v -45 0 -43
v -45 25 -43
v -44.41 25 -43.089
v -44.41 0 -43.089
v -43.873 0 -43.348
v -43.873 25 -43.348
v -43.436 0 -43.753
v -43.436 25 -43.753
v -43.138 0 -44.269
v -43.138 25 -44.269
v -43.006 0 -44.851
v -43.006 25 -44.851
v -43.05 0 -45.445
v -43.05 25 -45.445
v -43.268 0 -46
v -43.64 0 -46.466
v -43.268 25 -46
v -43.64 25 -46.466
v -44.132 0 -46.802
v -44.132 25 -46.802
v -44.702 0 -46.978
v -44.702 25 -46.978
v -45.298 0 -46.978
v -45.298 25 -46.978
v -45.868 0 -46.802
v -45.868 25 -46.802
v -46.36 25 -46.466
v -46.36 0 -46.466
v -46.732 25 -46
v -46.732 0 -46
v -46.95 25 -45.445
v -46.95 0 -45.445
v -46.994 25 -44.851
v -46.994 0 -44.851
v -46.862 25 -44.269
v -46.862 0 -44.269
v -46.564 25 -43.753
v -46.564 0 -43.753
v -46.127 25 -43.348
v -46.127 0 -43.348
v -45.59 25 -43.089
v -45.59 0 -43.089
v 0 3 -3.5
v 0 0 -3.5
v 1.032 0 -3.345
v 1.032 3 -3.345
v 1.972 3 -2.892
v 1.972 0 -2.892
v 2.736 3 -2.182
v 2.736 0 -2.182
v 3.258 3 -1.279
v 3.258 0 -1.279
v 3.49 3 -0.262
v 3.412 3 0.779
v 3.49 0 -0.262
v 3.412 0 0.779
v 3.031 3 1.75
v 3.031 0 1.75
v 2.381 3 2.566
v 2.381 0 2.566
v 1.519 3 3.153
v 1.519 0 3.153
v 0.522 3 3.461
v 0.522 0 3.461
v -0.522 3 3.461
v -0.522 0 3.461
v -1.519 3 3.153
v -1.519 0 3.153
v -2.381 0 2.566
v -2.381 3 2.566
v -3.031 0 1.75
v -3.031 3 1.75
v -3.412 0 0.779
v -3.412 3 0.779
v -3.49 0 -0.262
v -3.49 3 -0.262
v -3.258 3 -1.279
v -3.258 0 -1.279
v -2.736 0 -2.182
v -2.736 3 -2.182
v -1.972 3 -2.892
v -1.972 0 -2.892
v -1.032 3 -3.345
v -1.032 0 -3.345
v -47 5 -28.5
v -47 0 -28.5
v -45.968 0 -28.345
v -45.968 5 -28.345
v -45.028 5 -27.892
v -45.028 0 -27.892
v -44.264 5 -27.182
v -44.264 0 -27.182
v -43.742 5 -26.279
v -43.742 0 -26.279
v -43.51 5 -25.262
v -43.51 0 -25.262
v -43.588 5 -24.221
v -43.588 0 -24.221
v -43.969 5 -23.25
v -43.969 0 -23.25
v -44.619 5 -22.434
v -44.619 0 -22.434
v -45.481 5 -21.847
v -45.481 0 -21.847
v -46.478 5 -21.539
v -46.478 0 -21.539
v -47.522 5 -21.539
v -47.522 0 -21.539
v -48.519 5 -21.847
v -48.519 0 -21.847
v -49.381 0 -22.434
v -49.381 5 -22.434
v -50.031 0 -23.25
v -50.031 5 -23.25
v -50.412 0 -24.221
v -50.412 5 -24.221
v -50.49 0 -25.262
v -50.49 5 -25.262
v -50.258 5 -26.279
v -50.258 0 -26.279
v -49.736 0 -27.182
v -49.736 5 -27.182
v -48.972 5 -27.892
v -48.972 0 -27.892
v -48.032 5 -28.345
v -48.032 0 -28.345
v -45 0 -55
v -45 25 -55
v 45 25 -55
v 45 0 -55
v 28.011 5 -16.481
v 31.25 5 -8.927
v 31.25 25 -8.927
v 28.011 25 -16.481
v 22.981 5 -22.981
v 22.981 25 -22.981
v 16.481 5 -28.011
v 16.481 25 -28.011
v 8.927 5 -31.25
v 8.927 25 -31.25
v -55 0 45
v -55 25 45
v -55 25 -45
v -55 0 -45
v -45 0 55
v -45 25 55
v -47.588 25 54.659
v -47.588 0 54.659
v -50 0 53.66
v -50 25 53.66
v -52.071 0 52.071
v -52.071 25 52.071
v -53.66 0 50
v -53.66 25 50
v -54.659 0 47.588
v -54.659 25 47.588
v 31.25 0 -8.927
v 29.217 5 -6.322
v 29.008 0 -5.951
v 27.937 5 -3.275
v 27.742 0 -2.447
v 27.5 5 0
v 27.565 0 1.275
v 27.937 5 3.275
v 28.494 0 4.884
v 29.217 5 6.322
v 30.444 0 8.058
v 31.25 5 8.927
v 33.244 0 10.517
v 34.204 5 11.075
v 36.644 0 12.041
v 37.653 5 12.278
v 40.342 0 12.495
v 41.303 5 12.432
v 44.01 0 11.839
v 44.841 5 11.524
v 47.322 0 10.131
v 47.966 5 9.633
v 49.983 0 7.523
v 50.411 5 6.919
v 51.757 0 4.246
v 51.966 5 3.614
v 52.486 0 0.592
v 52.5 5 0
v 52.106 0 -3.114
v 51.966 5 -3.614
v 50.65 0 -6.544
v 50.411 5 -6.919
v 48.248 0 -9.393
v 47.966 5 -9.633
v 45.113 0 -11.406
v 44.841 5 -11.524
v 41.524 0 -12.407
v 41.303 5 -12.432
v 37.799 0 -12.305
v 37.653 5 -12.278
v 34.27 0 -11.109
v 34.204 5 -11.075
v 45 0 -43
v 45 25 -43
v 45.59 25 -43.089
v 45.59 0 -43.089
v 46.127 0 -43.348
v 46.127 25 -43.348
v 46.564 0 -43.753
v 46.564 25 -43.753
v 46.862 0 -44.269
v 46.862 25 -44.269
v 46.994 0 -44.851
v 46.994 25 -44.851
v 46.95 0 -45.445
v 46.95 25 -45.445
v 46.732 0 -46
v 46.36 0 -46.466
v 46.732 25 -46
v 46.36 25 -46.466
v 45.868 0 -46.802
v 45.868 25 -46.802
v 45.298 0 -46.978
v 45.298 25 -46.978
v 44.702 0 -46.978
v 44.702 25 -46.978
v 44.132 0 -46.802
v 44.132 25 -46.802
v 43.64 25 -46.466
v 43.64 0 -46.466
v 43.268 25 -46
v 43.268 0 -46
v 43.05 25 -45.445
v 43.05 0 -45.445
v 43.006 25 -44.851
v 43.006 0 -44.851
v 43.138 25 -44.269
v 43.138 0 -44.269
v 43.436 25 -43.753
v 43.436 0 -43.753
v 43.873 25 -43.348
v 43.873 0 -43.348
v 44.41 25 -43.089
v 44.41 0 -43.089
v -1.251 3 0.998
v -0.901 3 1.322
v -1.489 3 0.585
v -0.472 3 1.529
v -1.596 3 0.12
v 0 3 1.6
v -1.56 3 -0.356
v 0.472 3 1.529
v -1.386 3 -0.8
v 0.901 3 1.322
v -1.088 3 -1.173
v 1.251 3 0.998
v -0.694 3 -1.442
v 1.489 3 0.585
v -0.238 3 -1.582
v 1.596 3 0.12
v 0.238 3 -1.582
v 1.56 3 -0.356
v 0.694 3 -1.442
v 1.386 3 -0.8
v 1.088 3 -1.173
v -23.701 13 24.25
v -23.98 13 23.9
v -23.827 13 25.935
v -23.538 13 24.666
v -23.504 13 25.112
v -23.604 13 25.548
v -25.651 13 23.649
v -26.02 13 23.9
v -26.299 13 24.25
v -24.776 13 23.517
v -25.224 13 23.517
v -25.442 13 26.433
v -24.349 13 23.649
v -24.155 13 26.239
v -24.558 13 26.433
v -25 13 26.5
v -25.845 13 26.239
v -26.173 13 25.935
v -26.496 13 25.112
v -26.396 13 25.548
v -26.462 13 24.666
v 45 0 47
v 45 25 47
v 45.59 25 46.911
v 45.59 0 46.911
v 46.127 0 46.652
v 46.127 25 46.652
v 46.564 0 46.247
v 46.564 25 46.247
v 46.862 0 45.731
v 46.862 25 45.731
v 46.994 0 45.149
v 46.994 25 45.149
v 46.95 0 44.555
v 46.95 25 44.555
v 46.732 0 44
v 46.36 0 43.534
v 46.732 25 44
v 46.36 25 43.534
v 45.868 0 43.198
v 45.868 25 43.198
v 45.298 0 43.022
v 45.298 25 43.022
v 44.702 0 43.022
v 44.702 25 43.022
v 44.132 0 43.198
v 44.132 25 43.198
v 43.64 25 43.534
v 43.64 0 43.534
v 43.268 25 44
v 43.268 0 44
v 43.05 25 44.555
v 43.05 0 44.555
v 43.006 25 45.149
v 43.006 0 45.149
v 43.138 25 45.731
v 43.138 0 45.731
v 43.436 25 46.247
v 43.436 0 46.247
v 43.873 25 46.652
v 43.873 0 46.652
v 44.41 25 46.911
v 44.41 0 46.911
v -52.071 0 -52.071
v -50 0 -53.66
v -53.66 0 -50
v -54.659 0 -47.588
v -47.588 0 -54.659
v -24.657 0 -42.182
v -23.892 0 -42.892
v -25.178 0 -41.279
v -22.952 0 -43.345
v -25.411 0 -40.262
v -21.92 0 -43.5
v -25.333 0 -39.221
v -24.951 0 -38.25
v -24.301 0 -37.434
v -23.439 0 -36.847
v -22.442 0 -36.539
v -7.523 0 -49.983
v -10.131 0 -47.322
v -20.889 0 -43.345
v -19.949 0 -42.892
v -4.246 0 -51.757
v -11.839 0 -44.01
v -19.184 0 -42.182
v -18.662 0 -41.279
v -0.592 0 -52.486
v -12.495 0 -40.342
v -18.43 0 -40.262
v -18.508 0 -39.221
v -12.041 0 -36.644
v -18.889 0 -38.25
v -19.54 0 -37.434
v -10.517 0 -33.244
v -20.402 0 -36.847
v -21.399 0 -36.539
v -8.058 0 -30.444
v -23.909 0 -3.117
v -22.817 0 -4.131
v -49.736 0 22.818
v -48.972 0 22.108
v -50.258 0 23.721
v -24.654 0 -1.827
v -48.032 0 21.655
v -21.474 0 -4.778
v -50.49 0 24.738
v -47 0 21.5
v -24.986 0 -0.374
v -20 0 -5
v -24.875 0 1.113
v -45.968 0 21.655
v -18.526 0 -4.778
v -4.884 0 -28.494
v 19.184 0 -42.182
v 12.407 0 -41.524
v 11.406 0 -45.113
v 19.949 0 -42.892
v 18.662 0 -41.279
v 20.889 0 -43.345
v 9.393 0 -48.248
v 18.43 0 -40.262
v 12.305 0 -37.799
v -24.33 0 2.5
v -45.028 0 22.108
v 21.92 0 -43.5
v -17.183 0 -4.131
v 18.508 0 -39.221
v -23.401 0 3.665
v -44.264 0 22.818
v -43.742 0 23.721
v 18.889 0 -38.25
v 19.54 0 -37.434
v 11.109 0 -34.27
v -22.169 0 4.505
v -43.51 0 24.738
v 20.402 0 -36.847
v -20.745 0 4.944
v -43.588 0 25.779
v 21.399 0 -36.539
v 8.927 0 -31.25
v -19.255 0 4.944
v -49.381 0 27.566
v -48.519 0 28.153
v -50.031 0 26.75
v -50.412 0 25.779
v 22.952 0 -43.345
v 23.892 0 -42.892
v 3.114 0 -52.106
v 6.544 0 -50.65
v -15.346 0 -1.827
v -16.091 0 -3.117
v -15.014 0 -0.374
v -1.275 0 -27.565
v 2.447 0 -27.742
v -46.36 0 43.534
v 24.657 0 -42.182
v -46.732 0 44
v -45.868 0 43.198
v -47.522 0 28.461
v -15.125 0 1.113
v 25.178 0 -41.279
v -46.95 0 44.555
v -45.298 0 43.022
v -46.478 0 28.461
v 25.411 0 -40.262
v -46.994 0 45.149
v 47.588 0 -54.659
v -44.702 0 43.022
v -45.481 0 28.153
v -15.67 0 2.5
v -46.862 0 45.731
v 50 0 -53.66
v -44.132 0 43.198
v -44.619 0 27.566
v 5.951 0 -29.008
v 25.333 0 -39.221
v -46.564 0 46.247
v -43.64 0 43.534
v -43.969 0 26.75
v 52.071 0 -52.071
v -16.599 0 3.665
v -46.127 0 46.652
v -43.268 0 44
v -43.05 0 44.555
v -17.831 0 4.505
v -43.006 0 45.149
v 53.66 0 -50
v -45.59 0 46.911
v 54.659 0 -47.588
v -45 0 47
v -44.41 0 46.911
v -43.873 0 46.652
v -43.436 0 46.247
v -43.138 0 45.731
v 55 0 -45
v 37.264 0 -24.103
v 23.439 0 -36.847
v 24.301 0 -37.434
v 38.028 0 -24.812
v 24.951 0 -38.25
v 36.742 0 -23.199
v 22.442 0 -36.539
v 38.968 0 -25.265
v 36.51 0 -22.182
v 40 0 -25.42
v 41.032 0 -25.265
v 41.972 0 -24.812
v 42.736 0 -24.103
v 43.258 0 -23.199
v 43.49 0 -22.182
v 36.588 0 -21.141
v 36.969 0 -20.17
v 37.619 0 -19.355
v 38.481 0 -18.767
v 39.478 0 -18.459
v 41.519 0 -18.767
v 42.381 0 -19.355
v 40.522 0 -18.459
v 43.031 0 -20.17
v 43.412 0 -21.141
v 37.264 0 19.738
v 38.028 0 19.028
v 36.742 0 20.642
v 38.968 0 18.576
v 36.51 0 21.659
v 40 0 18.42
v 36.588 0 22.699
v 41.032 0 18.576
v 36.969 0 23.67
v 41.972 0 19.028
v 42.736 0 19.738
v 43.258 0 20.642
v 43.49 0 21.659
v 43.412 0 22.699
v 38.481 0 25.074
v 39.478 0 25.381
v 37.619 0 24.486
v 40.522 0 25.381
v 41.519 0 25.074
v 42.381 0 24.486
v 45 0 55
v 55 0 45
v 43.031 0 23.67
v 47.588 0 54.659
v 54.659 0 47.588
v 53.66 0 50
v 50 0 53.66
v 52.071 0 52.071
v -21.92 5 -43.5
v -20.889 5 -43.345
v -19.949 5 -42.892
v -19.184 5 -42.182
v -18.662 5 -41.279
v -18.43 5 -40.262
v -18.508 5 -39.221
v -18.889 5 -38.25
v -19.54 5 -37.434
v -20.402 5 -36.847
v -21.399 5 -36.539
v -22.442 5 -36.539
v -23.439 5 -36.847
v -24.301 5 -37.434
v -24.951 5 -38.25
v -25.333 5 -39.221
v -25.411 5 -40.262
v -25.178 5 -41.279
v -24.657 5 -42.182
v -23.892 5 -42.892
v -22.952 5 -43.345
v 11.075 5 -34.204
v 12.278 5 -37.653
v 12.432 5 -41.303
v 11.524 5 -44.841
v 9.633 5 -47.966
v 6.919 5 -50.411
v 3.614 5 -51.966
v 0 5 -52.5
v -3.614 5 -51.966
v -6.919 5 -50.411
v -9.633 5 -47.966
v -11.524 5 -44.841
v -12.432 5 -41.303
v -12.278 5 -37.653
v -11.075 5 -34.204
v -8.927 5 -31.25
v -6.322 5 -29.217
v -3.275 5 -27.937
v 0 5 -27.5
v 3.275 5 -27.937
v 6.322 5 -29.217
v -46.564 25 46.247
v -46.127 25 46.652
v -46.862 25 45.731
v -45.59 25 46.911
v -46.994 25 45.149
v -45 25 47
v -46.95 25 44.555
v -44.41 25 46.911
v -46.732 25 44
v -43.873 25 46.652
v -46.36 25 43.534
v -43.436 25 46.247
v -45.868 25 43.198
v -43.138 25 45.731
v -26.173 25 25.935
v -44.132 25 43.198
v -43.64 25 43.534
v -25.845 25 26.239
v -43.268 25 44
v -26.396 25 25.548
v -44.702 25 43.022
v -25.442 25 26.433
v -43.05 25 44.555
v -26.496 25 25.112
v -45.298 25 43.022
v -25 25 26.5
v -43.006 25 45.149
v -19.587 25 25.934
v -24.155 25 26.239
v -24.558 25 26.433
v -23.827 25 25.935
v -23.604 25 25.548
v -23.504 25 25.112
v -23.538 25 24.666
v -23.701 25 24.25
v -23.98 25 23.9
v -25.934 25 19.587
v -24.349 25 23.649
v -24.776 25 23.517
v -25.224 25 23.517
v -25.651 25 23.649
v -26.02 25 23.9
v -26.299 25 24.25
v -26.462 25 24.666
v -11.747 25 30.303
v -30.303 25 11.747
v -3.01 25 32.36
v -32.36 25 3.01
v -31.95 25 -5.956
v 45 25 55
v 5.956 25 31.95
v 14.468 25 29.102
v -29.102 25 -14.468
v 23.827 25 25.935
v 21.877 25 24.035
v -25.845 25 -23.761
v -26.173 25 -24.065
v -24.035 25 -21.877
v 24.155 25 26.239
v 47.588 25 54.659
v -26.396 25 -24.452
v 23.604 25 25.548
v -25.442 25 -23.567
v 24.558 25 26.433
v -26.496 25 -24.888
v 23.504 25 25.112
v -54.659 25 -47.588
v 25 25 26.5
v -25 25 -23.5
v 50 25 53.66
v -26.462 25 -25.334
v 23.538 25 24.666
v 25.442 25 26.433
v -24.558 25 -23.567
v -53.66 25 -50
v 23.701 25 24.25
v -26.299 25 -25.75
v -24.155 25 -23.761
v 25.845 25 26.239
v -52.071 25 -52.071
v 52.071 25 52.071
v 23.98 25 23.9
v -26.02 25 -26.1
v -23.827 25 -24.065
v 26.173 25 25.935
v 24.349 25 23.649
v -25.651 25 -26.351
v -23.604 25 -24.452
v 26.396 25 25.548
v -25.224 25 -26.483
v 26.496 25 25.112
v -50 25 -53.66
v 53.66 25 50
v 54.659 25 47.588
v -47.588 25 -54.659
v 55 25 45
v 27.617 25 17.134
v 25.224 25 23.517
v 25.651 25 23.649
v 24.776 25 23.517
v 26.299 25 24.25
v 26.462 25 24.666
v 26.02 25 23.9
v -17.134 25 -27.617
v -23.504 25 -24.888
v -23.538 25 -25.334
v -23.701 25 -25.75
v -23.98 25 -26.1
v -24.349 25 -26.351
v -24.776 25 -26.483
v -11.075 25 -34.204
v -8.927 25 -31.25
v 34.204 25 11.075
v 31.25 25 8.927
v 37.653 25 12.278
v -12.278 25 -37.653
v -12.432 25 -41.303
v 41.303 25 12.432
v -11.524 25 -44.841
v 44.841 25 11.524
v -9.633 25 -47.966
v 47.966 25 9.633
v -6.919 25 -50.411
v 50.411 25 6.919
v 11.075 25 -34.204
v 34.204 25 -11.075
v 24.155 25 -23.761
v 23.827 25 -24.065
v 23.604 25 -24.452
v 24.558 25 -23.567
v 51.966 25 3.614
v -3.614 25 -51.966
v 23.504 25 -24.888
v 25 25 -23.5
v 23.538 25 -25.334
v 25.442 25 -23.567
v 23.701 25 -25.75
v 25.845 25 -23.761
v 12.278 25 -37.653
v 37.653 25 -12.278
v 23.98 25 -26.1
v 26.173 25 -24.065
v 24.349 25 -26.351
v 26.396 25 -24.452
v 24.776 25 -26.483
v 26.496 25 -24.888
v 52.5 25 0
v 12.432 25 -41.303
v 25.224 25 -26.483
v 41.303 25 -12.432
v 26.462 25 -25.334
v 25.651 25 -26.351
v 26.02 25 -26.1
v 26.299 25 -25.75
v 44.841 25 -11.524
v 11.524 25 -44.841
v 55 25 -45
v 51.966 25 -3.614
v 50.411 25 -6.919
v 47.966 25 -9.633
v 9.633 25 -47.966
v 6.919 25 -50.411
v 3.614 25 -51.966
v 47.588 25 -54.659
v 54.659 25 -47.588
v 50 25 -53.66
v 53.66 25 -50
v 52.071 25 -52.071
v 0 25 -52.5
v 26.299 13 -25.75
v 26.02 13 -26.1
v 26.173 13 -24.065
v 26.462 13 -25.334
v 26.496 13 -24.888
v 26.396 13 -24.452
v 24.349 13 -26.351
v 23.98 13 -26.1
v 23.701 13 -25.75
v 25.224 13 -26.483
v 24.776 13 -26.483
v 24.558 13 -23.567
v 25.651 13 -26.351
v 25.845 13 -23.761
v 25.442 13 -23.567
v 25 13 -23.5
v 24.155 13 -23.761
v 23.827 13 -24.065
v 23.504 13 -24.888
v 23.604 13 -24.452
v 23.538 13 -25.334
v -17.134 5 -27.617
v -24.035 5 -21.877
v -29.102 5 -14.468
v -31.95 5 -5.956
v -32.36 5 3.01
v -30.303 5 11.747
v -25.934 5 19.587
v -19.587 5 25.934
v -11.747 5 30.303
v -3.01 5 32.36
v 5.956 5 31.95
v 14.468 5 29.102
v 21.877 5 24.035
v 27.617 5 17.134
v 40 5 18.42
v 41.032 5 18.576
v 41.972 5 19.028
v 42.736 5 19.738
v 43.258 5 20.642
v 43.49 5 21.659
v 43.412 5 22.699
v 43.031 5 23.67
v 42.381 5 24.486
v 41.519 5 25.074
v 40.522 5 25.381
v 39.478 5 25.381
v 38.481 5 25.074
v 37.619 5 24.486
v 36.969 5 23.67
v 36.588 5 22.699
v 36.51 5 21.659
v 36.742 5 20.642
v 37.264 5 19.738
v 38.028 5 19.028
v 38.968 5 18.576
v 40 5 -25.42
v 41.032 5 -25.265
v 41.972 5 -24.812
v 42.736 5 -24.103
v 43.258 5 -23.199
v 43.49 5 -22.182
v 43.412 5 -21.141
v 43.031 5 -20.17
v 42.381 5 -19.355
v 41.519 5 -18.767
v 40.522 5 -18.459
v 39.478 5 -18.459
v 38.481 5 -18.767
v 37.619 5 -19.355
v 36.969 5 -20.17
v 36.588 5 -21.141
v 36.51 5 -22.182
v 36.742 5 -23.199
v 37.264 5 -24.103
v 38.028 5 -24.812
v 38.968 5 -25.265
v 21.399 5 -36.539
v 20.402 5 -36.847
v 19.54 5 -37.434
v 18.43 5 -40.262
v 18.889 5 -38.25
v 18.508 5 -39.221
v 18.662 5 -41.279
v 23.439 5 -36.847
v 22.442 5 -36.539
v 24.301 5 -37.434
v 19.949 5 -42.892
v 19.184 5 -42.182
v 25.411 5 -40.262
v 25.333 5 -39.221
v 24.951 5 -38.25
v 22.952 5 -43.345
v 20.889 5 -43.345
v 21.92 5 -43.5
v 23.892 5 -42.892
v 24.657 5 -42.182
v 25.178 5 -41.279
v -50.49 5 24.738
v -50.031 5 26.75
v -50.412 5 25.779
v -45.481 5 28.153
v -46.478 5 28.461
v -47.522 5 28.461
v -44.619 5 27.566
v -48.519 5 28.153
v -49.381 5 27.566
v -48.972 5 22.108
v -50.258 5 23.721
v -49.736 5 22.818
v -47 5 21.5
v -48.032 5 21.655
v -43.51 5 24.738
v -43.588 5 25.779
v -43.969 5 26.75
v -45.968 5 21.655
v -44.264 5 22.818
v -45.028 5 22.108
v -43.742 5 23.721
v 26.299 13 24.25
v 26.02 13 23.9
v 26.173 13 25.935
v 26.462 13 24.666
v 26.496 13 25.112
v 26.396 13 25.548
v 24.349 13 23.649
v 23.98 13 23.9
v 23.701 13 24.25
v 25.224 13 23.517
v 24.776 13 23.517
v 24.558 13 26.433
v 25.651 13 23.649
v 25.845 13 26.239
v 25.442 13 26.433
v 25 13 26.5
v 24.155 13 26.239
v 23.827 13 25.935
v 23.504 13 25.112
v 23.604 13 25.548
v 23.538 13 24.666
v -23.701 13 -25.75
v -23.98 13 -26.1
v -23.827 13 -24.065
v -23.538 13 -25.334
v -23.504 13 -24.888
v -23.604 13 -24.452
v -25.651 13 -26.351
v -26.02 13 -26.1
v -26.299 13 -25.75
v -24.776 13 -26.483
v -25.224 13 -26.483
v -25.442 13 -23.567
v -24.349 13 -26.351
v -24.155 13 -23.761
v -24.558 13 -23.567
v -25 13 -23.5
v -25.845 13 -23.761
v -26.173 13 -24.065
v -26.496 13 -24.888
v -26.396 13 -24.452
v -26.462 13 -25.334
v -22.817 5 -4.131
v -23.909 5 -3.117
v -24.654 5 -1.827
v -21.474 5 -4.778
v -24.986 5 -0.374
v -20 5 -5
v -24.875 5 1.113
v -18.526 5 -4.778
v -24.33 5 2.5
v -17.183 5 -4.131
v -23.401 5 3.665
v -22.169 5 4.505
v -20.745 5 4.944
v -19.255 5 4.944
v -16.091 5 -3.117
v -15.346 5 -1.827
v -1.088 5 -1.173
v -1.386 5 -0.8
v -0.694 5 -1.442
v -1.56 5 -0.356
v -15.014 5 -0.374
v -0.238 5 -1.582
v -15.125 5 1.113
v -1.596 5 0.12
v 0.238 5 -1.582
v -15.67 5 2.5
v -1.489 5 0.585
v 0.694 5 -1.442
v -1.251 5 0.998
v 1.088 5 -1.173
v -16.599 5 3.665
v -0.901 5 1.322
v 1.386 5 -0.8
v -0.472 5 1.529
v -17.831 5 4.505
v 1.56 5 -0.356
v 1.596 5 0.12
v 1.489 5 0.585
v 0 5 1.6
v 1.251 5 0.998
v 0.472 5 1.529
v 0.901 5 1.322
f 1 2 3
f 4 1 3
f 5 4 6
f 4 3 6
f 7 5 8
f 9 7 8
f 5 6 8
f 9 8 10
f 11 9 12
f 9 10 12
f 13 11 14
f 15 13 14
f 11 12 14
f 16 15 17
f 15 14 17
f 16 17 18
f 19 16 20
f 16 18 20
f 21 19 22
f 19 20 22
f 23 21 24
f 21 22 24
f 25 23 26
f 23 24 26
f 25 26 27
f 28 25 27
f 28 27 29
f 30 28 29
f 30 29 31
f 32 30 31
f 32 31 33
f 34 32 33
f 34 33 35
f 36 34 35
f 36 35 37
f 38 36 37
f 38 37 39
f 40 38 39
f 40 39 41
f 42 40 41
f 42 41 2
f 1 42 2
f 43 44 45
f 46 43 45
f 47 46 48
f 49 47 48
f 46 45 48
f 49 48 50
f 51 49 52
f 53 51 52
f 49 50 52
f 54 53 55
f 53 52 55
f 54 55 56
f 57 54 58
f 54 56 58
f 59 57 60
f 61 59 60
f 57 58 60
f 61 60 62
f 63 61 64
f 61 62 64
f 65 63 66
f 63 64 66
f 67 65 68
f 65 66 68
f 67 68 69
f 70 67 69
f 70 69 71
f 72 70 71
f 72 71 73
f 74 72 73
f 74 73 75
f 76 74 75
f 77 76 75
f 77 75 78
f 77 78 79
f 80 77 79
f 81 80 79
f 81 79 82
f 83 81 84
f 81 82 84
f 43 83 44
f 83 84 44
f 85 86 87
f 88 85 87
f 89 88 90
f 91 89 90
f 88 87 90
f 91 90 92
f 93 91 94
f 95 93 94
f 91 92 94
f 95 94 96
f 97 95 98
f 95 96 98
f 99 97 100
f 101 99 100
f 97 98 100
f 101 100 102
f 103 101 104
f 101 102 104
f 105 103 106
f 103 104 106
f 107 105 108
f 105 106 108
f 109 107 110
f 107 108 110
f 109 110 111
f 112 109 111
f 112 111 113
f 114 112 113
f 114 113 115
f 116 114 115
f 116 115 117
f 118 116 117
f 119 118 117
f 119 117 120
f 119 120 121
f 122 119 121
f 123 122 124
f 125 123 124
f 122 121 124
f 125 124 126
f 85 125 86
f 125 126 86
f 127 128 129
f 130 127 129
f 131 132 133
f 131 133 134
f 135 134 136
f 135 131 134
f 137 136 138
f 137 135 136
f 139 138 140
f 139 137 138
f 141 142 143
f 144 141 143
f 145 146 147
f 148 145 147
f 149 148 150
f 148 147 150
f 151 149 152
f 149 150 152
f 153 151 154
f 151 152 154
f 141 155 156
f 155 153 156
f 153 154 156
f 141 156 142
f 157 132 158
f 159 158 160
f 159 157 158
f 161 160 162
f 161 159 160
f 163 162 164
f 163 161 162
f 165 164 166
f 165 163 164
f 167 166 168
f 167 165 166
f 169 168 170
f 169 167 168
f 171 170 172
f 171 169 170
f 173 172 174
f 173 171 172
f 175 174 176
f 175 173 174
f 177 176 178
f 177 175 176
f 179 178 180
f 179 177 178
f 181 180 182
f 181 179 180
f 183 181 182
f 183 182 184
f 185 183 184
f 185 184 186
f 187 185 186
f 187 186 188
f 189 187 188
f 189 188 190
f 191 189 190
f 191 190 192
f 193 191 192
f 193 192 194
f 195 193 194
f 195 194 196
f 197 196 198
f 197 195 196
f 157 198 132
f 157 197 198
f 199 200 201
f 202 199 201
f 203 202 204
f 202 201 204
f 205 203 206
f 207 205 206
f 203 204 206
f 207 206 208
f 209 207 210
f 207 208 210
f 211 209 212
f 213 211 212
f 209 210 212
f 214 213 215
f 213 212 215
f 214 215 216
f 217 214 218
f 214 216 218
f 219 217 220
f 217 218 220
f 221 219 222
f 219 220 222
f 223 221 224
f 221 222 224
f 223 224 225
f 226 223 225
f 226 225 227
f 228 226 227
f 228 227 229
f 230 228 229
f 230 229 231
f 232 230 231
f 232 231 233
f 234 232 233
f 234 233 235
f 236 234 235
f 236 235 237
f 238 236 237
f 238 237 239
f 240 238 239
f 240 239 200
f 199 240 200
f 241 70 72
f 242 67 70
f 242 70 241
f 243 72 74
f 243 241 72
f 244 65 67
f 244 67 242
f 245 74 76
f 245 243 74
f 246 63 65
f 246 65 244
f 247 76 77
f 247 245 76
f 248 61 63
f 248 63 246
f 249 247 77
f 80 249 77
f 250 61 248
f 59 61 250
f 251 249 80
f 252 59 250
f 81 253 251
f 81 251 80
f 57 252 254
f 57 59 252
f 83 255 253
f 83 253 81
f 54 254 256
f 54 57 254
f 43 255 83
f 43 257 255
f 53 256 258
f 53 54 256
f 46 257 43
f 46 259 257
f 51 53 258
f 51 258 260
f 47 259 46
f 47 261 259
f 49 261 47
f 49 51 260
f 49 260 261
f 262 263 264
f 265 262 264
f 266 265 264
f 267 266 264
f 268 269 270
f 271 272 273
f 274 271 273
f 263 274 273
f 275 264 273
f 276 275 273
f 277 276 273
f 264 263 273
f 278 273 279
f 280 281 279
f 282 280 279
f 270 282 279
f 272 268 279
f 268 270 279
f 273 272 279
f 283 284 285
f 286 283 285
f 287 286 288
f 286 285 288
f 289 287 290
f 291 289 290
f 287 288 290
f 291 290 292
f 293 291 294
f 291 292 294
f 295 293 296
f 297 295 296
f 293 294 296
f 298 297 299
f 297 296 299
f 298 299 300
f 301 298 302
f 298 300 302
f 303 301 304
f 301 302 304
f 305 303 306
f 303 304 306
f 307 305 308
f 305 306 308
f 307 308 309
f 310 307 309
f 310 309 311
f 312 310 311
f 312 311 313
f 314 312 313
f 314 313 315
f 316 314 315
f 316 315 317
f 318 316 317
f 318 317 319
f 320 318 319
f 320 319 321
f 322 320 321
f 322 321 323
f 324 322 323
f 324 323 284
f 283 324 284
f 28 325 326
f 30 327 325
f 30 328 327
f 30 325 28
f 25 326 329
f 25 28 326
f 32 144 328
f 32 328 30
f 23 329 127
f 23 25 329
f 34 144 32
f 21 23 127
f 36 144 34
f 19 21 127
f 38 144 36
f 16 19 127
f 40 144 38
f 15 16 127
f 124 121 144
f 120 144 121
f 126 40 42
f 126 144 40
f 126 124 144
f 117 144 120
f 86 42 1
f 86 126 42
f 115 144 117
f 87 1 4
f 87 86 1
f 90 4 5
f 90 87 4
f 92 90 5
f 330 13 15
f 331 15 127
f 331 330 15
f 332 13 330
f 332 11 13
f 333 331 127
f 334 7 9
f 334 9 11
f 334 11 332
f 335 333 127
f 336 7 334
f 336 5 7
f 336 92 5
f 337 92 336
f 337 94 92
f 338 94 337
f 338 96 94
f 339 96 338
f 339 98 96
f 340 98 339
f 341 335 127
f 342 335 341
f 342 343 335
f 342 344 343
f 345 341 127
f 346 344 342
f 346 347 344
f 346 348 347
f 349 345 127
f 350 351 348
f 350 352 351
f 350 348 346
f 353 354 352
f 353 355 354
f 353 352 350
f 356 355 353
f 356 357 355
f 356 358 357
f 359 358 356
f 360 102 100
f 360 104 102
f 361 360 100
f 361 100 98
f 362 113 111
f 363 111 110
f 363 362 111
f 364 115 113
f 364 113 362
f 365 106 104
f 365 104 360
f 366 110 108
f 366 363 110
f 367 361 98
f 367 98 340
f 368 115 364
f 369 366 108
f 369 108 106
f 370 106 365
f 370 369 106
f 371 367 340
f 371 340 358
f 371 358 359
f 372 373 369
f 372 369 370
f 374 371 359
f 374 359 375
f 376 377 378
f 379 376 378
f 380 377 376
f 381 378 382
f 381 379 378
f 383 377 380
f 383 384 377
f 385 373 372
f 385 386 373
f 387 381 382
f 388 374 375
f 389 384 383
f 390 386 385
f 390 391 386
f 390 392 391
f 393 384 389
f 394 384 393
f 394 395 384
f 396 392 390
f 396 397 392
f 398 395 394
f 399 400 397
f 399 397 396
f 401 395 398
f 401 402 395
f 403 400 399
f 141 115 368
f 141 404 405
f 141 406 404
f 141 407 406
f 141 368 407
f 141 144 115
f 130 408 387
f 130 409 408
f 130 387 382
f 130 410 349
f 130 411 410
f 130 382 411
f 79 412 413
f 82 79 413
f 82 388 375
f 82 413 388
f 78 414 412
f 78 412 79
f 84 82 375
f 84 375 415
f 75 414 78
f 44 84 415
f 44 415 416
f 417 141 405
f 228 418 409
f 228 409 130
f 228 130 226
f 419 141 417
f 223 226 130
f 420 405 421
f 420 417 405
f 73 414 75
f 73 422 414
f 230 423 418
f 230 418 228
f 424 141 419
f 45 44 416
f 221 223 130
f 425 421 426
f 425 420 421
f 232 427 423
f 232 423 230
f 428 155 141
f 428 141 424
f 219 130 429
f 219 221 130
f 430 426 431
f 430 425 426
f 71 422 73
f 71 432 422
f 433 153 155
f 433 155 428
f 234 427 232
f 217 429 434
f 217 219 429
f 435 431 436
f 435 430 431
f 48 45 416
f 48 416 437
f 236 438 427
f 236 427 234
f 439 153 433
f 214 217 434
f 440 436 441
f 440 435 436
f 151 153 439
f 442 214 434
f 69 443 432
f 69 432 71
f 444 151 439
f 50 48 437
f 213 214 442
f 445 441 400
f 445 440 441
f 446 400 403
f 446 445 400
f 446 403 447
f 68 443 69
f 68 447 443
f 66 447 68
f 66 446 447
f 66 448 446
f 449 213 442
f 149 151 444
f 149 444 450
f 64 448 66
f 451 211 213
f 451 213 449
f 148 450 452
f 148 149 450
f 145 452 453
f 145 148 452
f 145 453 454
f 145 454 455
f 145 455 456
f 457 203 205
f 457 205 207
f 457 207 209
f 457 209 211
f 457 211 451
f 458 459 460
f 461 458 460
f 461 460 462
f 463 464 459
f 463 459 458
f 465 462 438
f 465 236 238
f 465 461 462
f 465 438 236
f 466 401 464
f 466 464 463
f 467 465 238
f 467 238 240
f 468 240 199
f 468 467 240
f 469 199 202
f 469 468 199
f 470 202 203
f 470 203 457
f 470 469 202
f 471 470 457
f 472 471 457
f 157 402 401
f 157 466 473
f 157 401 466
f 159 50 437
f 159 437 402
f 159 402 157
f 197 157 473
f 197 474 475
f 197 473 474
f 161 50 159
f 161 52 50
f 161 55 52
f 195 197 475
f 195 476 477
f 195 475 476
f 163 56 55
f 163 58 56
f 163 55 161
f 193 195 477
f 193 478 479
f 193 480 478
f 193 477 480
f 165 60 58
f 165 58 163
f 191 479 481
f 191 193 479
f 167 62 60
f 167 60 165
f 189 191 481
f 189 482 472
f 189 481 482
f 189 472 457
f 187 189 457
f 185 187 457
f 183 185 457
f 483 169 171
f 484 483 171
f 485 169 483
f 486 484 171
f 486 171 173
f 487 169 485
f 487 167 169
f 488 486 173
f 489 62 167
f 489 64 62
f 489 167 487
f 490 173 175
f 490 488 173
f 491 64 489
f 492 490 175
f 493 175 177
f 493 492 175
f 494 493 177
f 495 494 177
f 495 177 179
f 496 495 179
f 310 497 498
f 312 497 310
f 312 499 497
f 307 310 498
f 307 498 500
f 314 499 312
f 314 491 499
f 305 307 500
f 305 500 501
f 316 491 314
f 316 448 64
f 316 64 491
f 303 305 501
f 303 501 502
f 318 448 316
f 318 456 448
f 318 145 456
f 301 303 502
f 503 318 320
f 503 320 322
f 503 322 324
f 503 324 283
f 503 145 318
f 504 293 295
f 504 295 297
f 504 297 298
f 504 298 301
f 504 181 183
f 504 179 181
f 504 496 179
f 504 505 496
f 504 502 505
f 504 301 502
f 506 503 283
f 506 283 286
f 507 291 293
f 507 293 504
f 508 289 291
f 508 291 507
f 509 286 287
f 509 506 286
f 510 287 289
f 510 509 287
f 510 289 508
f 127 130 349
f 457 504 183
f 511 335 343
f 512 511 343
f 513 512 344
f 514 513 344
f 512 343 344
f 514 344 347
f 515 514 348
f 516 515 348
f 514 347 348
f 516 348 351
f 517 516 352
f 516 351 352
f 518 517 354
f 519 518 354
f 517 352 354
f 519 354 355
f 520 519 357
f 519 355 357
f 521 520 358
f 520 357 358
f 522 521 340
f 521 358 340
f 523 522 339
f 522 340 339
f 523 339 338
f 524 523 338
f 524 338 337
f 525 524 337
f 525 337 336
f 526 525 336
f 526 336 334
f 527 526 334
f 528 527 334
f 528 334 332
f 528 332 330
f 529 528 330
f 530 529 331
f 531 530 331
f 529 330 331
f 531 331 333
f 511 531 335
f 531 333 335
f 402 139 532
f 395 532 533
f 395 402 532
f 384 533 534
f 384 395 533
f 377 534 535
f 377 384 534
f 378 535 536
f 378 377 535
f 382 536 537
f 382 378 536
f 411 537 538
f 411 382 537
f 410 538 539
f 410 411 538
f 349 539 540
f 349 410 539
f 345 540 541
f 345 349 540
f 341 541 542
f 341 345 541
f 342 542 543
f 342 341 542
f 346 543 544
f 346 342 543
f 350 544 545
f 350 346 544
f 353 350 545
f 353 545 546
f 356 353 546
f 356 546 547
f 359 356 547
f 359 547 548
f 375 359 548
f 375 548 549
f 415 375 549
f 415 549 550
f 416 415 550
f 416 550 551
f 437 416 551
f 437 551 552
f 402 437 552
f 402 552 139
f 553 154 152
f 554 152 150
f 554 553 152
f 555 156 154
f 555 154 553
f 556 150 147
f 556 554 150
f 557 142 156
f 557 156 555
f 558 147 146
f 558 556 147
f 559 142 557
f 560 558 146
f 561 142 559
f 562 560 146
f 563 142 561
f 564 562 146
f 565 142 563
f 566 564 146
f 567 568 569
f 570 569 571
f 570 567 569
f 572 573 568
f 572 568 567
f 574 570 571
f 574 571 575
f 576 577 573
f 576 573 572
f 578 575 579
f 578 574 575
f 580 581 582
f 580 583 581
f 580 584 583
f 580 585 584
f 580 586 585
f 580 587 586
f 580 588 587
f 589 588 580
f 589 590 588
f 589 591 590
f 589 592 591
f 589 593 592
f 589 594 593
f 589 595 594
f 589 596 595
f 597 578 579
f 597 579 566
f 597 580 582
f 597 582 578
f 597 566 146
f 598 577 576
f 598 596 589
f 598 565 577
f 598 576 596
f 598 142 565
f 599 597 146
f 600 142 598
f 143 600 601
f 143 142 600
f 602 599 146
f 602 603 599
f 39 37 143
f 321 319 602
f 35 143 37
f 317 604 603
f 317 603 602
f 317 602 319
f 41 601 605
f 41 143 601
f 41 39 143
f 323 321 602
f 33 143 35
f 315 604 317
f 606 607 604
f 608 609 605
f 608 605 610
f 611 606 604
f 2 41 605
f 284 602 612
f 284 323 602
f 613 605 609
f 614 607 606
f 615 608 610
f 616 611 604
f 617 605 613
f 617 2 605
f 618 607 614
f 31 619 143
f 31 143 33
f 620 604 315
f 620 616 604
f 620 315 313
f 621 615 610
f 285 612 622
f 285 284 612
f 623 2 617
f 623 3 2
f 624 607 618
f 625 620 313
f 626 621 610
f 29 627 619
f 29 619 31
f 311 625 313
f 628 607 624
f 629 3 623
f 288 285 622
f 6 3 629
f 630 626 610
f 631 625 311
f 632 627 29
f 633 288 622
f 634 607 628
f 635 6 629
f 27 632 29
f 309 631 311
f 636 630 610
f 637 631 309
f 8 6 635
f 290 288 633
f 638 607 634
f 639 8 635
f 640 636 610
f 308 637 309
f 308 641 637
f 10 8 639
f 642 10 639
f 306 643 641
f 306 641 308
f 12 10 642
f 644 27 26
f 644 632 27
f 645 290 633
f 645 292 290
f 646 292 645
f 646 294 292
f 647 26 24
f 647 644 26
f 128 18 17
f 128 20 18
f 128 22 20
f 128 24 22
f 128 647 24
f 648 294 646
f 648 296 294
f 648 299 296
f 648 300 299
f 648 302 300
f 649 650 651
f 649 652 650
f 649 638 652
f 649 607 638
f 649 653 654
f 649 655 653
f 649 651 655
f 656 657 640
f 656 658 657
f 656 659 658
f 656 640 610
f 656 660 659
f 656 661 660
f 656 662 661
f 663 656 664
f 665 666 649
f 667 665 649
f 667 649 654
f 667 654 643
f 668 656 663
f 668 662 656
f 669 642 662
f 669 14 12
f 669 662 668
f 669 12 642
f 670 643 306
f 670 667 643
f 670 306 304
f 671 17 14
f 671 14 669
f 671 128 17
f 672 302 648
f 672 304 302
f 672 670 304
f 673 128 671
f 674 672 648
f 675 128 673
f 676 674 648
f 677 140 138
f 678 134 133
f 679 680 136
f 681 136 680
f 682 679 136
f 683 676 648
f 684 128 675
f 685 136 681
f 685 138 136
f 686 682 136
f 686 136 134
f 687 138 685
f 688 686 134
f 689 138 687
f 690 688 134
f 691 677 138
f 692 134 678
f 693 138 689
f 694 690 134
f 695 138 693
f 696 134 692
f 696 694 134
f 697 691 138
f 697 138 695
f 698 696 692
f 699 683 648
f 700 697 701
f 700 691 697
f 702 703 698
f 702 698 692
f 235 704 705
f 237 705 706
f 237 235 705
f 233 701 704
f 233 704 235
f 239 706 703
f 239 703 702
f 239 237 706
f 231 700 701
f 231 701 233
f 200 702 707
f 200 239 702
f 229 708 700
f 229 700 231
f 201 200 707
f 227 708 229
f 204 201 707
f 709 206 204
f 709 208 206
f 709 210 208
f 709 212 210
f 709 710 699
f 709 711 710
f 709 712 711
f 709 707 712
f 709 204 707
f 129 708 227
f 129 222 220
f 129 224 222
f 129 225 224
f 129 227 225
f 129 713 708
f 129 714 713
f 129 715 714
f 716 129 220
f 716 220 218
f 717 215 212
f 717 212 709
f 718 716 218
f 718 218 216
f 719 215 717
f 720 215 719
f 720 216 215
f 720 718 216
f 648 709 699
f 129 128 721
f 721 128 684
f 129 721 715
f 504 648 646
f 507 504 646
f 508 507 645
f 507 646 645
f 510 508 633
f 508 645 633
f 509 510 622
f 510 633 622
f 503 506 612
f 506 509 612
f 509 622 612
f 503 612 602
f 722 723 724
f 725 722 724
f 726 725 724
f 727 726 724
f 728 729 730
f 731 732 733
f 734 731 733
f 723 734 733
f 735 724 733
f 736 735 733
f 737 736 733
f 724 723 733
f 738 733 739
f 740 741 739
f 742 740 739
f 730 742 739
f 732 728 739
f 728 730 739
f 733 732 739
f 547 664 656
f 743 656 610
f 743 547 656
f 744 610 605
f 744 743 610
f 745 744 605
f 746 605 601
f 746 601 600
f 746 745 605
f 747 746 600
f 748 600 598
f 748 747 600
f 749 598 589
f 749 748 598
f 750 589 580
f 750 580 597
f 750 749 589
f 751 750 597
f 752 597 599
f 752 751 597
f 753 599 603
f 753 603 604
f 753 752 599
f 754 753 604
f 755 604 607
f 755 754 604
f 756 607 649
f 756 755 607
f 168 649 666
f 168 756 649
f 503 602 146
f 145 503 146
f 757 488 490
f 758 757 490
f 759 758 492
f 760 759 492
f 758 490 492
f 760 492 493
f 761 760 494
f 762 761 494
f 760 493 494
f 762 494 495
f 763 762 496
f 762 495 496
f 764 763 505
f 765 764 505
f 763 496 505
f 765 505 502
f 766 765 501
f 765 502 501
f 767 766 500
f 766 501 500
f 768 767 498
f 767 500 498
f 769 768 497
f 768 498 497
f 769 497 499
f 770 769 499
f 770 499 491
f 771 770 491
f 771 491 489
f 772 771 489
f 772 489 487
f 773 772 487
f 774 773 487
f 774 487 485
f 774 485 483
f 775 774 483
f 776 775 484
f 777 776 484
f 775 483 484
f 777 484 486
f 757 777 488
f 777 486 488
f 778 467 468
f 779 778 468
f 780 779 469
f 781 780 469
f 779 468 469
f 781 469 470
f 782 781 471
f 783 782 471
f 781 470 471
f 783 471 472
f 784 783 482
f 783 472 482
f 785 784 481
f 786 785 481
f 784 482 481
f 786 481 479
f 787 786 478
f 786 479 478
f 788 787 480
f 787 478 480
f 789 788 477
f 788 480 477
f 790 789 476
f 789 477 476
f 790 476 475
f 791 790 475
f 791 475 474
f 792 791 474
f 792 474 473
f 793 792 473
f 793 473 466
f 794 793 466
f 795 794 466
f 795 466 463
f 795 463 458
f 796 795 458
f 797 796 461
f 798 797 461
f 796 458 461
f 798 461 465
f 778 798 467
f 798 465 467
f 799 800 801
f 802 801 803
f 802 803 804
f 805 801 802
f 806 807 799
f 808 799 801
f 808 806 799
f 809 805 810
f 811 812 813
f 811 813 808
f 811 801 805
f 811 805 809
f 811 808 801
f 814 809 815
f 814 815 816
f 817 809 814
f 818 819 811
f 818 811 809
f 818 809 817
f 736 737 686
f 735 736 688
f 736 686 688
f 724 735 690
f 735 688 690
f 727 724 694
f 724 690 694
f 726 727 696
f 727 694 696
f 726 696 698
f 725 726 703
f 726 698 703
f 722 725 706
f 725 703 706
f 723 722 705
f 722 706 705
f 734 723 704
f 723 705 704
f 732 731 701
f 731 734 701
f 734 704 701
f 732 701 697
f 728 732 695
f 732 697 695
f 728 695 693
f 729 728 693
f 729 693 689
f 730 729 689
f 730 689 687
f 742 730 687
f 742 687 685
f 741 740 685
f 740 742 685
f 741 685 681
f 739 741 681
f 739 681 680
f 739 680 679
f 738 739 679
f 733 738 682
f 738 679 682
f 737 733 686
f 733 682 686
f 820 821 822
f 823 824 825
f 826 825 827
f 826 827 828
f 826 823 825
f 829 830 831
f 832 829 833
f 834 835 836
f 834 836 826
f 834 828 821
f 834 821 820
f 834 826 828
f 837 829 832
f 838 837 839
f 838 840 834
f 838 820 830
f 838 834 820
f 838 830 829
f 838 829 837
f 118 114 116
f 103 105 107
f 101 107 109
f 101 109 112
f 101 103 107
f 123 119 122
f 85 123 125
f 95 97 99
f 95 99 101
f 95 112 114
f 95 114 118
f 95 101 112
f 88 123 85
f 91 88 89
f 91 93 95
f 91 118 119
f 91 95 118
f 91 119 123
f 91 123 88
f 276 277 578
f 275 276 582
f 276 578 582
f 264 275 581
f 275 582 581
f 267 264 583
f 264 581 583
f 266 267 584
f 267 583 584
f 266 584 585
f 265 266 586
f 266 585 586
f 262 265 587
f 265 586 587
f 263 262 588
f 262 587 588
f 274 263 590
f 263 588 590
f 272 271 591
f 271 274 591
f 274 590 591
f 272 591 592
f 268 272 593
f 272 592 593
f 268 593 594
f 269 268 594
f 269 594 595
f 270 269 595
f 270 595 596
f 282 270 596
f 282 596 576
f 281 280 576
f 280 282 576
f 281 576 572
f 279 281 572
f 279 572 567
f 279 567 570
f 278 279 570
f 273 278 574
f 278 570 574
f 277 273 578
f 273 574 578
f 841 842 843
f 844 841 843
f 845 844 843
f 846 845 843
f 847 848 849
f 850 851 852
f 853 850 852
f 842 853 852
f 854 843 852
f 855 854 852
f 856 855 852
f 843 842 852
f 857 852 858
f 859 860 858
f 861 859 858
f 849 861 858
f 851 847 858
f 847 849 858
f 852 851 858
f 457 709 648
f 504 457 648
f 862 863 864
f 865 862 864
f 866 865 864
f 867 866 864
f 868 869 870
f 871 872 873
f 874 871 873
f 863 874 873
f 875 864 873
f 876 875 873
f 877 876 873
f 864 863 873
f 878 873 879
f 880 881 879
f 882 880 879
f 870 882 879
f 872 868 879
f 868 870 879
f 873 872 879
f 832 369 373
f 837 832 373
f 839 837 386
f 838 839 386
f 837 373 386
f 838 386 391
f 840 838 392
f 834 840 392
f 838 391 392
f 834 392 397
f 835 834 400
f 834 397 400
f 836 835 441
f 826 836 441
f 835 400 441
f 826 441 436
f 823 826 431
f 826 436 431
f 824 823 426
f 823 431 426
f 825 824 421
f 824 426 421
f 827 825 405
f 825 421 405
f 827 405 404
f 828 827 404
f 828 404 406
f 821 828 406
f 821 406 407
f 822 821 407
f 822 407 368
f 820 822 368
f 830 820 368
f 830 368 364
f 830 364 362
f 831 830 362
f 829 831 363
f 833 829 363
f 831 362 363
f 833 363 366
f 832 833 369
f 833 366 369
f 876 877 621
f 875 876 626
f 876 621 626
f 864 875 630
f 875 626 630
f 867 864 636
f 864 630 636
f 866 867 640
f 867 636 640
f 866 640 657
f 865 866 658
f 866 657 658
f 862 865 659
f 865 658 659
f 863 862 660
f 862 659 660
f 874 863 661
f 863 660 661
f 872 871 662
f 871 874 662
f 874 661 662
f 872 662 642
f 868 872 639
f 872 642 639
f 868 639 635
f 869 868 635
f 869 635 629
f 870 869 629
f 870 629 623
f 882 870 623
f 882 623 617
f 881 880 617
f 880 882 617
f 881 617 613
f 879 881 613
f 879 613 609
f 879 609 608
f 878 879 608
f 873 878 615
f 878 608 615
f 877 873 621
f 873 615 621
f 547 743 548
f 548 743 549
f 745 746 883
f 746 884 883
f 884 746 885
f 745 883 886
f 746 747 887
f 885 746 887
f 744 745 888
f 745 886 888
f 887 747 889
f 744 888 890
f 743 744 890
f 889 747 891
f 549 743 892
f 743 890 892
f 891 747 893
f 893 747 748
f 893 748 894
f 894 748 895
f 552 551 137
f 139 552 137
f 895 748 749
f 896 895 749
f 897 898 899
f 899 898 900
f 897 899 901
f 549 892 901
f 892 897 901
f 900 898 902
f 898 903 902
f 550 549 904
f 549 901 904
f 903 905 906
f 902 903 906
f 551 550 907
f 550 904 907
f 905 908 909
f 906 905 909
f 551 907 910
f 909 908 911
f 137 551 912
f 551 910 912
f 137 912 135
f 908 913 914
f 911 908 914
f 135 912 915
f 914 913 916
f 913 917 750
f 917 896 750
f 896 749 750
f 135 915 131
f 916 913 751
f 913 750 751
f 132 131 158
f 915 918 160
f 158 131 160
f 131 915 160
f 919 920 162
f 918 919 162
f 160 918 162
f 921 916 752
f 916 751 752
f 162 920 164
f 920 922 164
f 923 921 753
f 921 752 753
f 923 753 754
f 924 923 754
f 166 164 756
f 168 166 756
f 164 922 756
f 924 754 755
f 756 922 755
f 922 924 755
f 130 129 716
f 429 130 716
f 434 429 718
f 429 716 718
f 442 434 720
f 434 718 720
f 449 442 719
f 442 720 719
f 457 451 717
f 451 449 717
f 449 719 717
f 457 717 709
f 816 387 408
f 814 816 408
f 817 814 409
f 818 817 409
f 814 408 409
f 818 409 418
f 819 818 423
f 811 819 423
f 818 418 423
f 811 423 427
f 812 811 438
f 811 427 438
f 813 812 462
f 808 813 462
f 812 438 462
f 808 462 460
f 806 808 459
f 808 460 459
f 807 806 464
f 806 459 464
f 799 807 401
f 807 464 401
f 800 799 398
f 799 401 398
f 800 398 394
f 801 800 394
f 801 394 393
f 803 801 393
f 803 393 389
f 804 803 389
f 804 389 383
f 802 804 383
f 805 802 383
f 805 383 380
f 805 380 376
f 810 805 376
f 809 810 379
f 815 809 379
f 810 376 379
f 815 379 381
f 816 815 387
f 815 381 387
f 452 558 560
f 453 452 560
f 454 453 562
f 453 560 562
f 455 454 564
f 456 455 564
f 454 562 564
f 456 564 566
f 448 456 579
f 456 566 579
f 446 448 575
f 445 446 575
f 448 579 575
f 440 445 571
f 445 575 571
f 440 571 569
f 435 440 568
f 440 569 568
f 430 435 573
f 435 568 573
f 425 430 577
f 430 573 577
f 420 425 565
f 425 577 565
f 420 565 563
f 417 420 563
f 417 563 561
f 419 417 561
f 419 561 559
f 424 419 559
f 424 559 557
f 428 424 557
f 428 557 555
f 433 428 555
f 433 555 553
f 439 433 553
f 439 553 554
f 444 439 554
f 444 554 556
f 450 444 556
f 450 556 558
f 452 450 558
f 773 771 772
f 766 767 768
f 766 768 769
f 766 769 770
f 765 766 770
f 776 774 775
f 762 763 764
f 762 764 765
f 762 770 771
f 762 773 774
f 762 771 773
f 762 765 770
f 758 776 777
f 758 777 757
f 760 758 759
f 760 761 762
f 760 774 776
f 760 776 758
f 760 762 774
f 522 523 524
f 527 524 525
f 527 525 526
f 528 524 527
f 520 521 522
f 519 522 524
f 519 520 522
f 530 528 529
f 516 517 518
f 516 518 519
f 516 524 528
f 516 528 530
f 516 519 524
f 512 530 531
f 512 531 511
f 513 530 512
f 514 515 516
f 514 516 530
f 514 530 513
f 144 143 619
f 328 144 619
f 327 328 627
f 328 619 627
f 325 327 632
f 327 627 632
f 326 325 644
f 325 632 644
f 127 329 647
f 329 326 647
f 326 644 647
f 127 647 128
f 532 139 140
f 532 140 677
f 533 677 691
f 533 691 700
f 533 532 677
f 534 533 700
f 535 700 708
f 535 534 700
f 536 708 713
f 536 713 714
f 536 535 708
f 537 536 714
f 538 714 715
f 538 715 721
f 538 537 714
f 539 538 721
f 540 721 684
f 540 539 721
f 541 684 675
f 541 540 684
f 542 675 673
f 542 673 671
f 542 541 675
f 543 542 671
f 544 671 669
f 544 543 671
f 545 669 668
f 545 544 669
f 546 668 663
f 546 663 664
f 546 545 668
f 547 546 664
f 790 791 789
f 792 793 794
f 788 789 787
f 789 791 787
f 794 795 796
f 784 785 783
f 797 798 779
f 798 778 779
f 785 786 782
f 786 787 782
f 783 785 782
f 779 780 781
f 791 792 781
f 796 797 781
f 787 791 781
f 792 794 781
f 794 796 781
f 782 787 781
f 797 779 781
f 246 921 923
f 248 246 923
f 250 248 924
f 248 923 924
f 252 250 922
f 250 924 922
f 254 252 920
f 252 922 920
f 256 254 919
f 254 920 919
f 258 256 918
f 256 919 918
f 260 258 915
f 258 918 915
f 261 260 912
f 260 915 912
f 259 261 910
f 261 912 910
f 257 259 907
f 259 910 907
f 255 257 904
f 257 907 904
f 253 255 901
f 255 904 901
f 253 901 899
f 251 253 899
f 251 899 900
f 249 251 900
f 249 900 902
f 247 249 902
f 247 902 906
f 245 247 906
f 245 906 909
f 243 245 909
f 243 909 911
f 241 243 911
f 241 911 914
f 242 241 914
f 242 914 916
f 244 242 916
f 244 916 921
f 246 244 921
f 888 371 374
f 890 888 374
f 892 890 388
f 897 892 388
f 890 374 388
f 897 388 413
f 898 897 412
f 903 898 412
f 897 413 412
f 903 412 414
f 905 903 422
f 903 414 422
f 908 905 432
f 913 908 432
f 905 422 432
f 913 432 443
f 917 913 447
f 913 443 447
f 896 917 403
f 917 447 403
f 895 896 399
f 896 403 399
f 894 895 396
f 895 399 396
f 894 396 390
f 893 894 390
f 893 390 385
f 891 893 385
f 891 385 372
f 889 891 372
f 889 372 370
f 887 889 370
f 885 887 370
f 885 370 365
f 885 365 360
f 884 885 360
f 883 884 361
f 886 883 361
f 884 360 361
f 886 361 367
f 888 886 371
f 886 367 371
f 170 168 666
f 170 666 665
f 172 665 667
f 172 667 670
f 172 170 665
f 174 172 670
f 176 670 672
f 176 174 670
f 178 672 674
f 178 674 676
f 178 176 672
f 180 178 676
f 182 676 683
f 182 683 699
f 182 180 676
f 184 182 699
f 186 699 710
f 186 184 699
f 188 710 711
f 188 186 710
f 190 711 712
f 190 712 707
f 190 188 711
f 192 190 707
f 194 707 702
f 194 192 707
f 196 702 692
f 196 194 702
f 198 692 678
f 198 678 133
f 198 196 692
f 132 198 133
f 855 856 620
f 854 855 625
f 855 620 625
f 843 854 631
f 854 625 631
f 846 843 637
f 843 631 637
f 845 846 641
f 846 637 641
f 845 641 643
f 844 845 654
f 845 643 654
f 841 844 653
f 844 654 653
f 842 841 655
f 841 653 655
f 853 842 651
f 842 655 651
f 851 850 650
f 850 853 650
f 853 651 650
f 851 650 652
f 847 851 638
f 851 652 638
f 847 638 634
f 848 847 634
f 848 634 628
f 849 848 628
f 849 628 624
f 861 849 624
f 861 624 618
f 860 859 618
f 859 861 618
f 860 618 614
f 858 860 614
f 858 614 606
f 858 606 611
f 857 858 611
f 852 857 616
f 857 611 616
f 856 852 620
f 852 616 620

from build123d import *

# Parameters (mm, degrees)
SKETCH_1_W          = 130
SKETCH_1_H          = 130
SKETCH_1_R          = 1.6
EXTRUDE_1_DEPTH     = 25
SKETCH_2_R          = 5
EXTRUDE_2_DEPTH     = 5
SKETCH_3_R          = 1.5
SKETCH_3_R_2        = 2
CUT_EXTRUDE_1_DEPTH = 103.102889283
FILLET_1_R          = 10
SKETCH_4_R          = 1.6
CUT_EXTRUDE_2_DEPTH = 10
CUT_EXTRUDE_START   = -10
SKETCH_5_R          = 12.5
CUT_EXTRUDE_3_DEPTH = 10
SKETCH_6_OUTSIDE_W  = 169.108
SKETCH_6_OUTSIDE_H  = 169.108
CUT_EXTRUDE_4_DEPTH = 103.102889283
SKETCH_7_R          = 3.5
CUT_EXTRUDE_5_DEPTH = 3
SKETCH_9_R          = 3.5
CUT_EXTRUDE_6_DEPTH = 5
EXTRUDE_START       = -20
SKETCH_10_R         = 1.6
EXTRUDE_3_DEPTH     = 20
EXTRUDE_START_2     = -13
SKETCH_11_R         = 1.5
EXTRUDE_4_DEPTH     = 13


with BuildPart() as part:
    # 草图1 → 凸台-拉伸1 (new body)
    with BuildSketch(Plane(origin=(0, 0, 0), x_dir=(1, 0, 0), z_dir=(0, 1, 0))):
        with Locations((5, 5)):
            Rectangle(SKETCH_1_W, SKETCH_1_H)
        with Locations(Location((61.920310217, 0, 0), (0, 0, 270))):
            Circle(SKETCH_1_R, mode=Mode.SUBTRACT)
        with Locations(Location((40, -21.920310217, 0), (0, 0, 270))):
            Circle(SKETCH_1_R, mode=Mode.SUBTRACT)
        with Locations(Location((40, 21.920310217, 0), (0, 0, 270))):
            Circle(SKETCH_1_R, mode=Mode.SUBTRACT)
        with Locations(Location((21.920310217, 40, 0), (0, 0, 270))):
            Circle(SKETCH_1_R, mode=Mode.SUBTRACT)
        with Locations(Location((-21.920310217, 40, 0), (0, 0, 270))):
            Circle(SKETCH_1_R, mode=Mode.SUBTRACT)
        with Locations(Location((0, 61.920310217, 0), (0, 0, 270))):
            Circle(SKETCH_1_R, mode=Mode.SUBTRACT)
        with BuildLine():
            ThreePointArc((-8.926785536, 31.25), (-22.980970389, -22.980970389), (31.25, -8.926785536))
            ThreePointArc((31.25, -8.926785536), (52.5, 0), (31.25, 8.926785536))
            ThreePointArc((31.25, 8.926785536), (22.980970389, 22.980970389), (8.926785536, 31.25))
            ThreePointArc((8.926785536, 31.25), (0, 52.5), (-8.926785536, 31.25))
        make_face(mode=Mode.SUBTRACT)
    extrude(amount=EXTRUDE_1_DEPTH)

    # 草图2 → 凸台-拉伸2 (add)
    with BuildSketch(Plane.XZ):
        with BuildLine():
            ThreePointArc((-8.926785536, -31.25), (0, -52.5), (8.926785536, -31.25))
            ThreePointArc((8.926785536, -31.25), (22.980970389, -22.980970389), (31.25, -8.926785536))
            ThreePointArc((31.25, -8.926785536), (52.5, 0), (31.25, 8.926785536))
            ThreePointArc((31.25, 8.926785536), (-22.980970389, 22.980970389), (-8.926785536, -31.25))
        make_face()
        with Locations(Location((-20, 0, 0), (0, 0, 270))):
            Circle(SKETCH_2_R, mode=Mode.SUBTRACT)
    extrude(amount=-EXTRUDE_2_DEPTH)

    # 草图3 → 切除-拉伸1 (cut, through all)
    with BuildSketch(Plane(origin=(0, 25, 0), x_dir=(1, 0, 0), z_dir=(0, 1, 0))):
        with Locations(Location((-25, 25, 0), (0, 0, 270))):
            Circle(SKETCH_3_R)
        with Locations(Location((25, 25, 0), (0, 0, 270))):
            Circle(SKETCH_3_R)
        with Locations(Location((-25, -25, 0), (0, 0, 270))):
            Circle(SKETCH_3_R)
        with Locations(Location((25, -25, 0), (0, 0, 270))):
            Circle(SKETCH_3_R)
        with Locations(Location((-45, 45, 0), (0, 0, 270))):
            Circle(SKETCH_3_R_2)
        with Locations(Location((45, 45, 0), (0, 0, 270))):
            Circle(SKETCH_3_R_2)
        with Locations(Location((45, -45, 0), (0, 0, 270))):
            Circle(SKETCH_3_R_2)
        with Locations(Location((-45, -45, 0), (0, 0, 270))):
            Circle(SKETCH_3_R_2)
    extrude(amount=-CUT_EXTRUDE_1_DEPTH, mode=Mode.SUBTRACT)

    # 圆角1
    fillet_1_edges = [part.edges().sort_by_distance(p)[0] for p in [
        (-60, 12.5, -70),
        (70, 12.5, -70),
        (70, 12.5, 60),
        (-60, 12.5, 60),
    ]]
    fillet(fillet_1_edges, radius=FILLET_1_R)

    # 草图4 → 切除-拉伸2 (cut)
    with BuildSketch(Plane(origin=(0, 5, 0), x_dir=(1, 0, 0), z_dir=(0, 1, 0))):
        with Locations(Location((0, 0, 0), (0, 0, 270))):
            Circle(SKETCH_4_R)
    extrude(amount=-CUT_EXTRUDE_2_DEPTH, mode=Mode.SUBTRACT)

    # 草图5 → 切除-拉伸3 (cut)
    with BuildSketch(Plane(origin=(0, 5, 0), x_dir=(1, 0, 0), z_dir=(0, 1, 0)).offset(CUT_EXTRUDE_START)):
        with Locations(Location((40, 0, 0), (0, 0, 134.427004001))):
            Circle(SKETCH_5_R)
        with Locations(Location((0, 40, 0), (0, 0, 315.572995999))):
            Circle(SKETCH_5_R)
    extrude(amount=CUT_EXTRUDE_3_DEPTH, mode=Mode.SUBTRACT)

    # 草图6 outside → 切除-拉伸4 (cut, through all)
    with BuildSketch(Plane(origin=(0, 25, 0), x_dir=(1, 0, 0), z_dir=(0, 1, 0))):
        with Locations((5, 5)):
            Rectangle(SKETCH_6_OUTSIDE_W, SKETCH_6_OUTSIDE_H)
        with BuildLine():
            Line((45, -55), (-45, -55))
            ThreePointArc((-45, -55), (-52.071067812, -52.071067812), (-55, -45))
            Line((-55, -45), (-55, 45))
            ThreePointArc((-55, 45), (-52.071067812, 52.071067812), (-45, 55))
            Line((-45, 55), (45, 55))
            ThreePointArc((45, 55), (52.071067812, 52.071067812), (55, 45))
            Line((55, 45), (55, -45))
            ThreePointArc((55, -45), (52.071067812, -52.071067812), (45, -55))
        make_face(mode=Mode.SUBTRACT)
    extrude(amount=-CUT_EXTRUDE_4_DEPTH, mode=Mode.SUBTRACT)

    # 草图7 → 切除-拉伸5 (cut)
    with BuildSketch(Plane.XZ):
        with Locations(Location((0, 0, 0), (0, 0, 270))):
            Circle(SKETCH_7_R)
    extrude(amount=-CUT_EXTRUDE_5_DEPTH, mode=Mode.SUBTRACT)

    # 草图9 → 切除-拉伸6 (cut)
    with BuildSketch(Plane.XZ):
        with Locations(Location((-21.920310217, -40, 0), (0, 0, 270))):
            Circle(SKETCH_9_R)
        with Locations(Location((21.920310217, -40, 0), (0, 0, 270))):
            Circle(SKETCH_9_R)
        with Locations(Location((40, -21.920310217, 0), (0, 0, 270))):
            Circle(SKETCH_9_R)
        with Locations(Location((40, 21.920310217, 0), (0, 0, 270))):
            Circle(SKETCH_9_R)
        with Locations(Location((-47, 25, 0), (0, 0, 270))):
            Circle(SKETCH_9_R)
        with Locations(Location((-47, -25, 0), (0, 0, 270))):
            Circle(SKETCH_9_R)
    extrude(amount=-CUT_EXTRUDE_6_DEPTH, mode=Mode.SUBTRACT)

    # 草图10 → 凸台-拉伸3 (add)
    with BuildSketch(Plane(origin=(0, 25, 0), x_dir=(1, 0, 0), z_dir=(0, 1, 0)).offset(EXTRUDE_START)):
        with Locations((40, 21.920310217)):
            Circle(SKETCH_10_R)
        with Locations((40, -21.920310217)):
            Circle(SKETCH_10_R)
        with Locations((-21.920310217, 40)):
            Circle(SKETCH_10_R)
        with Locations((21.920310217, 40)):
            Circle(SKETCH_10_R)
    extrude(amount=EXTRUDE_3_DEPTH)

    # 草图11 → 凸台-拉伸4 (add)
    with BuildSketch(Plane.XZ.offset(EXTRUDE_START_2)):
        with Locations(Location((25, 25, 0), (0, 0, 90))):
            Circle(SKETCH_11_R)
        with Locations(Location((-25, 25, 0), (0, 0, 90))):
            Circle(SKETCH_11_R)
        with Locations(Location((-25, -25, 0), (0, 0, 90))):
            Circle(SKETCH_11_R)
        with Locations(Location((25, -25, 0), (0, 0, 90))):
            Circle(SKETCH_11_R)
    extrude(amount=EXTRUDE_4_DEPTH)


solid = part.part
